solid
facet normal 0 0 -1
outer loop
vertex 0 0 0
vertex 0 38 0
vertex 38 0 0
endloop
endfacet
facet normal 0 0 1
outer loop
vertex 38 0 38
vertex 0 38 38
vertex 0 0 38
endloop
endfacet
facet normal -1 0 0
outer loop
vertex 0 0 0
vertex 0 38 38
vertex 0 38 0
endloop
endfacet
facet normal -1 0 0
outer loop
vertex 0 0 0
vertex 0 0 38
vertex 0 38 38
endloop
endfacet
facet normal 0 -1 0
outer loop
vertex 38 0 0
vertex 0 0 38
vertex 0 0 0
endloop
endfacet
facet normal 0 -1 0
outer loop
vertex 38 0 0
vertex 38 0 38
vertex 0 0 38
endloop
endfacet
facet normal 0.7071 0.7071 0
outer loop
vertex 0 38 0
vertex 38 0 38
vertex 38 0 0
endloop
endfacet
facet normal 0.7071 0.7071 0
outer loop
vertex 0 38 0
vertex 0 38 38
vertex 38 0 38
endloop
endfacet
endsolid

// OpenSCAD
s = 38;

linear_extrude(height = s)
polygon([
  [0, 0], [0, s],
  [s, 0]
]);
